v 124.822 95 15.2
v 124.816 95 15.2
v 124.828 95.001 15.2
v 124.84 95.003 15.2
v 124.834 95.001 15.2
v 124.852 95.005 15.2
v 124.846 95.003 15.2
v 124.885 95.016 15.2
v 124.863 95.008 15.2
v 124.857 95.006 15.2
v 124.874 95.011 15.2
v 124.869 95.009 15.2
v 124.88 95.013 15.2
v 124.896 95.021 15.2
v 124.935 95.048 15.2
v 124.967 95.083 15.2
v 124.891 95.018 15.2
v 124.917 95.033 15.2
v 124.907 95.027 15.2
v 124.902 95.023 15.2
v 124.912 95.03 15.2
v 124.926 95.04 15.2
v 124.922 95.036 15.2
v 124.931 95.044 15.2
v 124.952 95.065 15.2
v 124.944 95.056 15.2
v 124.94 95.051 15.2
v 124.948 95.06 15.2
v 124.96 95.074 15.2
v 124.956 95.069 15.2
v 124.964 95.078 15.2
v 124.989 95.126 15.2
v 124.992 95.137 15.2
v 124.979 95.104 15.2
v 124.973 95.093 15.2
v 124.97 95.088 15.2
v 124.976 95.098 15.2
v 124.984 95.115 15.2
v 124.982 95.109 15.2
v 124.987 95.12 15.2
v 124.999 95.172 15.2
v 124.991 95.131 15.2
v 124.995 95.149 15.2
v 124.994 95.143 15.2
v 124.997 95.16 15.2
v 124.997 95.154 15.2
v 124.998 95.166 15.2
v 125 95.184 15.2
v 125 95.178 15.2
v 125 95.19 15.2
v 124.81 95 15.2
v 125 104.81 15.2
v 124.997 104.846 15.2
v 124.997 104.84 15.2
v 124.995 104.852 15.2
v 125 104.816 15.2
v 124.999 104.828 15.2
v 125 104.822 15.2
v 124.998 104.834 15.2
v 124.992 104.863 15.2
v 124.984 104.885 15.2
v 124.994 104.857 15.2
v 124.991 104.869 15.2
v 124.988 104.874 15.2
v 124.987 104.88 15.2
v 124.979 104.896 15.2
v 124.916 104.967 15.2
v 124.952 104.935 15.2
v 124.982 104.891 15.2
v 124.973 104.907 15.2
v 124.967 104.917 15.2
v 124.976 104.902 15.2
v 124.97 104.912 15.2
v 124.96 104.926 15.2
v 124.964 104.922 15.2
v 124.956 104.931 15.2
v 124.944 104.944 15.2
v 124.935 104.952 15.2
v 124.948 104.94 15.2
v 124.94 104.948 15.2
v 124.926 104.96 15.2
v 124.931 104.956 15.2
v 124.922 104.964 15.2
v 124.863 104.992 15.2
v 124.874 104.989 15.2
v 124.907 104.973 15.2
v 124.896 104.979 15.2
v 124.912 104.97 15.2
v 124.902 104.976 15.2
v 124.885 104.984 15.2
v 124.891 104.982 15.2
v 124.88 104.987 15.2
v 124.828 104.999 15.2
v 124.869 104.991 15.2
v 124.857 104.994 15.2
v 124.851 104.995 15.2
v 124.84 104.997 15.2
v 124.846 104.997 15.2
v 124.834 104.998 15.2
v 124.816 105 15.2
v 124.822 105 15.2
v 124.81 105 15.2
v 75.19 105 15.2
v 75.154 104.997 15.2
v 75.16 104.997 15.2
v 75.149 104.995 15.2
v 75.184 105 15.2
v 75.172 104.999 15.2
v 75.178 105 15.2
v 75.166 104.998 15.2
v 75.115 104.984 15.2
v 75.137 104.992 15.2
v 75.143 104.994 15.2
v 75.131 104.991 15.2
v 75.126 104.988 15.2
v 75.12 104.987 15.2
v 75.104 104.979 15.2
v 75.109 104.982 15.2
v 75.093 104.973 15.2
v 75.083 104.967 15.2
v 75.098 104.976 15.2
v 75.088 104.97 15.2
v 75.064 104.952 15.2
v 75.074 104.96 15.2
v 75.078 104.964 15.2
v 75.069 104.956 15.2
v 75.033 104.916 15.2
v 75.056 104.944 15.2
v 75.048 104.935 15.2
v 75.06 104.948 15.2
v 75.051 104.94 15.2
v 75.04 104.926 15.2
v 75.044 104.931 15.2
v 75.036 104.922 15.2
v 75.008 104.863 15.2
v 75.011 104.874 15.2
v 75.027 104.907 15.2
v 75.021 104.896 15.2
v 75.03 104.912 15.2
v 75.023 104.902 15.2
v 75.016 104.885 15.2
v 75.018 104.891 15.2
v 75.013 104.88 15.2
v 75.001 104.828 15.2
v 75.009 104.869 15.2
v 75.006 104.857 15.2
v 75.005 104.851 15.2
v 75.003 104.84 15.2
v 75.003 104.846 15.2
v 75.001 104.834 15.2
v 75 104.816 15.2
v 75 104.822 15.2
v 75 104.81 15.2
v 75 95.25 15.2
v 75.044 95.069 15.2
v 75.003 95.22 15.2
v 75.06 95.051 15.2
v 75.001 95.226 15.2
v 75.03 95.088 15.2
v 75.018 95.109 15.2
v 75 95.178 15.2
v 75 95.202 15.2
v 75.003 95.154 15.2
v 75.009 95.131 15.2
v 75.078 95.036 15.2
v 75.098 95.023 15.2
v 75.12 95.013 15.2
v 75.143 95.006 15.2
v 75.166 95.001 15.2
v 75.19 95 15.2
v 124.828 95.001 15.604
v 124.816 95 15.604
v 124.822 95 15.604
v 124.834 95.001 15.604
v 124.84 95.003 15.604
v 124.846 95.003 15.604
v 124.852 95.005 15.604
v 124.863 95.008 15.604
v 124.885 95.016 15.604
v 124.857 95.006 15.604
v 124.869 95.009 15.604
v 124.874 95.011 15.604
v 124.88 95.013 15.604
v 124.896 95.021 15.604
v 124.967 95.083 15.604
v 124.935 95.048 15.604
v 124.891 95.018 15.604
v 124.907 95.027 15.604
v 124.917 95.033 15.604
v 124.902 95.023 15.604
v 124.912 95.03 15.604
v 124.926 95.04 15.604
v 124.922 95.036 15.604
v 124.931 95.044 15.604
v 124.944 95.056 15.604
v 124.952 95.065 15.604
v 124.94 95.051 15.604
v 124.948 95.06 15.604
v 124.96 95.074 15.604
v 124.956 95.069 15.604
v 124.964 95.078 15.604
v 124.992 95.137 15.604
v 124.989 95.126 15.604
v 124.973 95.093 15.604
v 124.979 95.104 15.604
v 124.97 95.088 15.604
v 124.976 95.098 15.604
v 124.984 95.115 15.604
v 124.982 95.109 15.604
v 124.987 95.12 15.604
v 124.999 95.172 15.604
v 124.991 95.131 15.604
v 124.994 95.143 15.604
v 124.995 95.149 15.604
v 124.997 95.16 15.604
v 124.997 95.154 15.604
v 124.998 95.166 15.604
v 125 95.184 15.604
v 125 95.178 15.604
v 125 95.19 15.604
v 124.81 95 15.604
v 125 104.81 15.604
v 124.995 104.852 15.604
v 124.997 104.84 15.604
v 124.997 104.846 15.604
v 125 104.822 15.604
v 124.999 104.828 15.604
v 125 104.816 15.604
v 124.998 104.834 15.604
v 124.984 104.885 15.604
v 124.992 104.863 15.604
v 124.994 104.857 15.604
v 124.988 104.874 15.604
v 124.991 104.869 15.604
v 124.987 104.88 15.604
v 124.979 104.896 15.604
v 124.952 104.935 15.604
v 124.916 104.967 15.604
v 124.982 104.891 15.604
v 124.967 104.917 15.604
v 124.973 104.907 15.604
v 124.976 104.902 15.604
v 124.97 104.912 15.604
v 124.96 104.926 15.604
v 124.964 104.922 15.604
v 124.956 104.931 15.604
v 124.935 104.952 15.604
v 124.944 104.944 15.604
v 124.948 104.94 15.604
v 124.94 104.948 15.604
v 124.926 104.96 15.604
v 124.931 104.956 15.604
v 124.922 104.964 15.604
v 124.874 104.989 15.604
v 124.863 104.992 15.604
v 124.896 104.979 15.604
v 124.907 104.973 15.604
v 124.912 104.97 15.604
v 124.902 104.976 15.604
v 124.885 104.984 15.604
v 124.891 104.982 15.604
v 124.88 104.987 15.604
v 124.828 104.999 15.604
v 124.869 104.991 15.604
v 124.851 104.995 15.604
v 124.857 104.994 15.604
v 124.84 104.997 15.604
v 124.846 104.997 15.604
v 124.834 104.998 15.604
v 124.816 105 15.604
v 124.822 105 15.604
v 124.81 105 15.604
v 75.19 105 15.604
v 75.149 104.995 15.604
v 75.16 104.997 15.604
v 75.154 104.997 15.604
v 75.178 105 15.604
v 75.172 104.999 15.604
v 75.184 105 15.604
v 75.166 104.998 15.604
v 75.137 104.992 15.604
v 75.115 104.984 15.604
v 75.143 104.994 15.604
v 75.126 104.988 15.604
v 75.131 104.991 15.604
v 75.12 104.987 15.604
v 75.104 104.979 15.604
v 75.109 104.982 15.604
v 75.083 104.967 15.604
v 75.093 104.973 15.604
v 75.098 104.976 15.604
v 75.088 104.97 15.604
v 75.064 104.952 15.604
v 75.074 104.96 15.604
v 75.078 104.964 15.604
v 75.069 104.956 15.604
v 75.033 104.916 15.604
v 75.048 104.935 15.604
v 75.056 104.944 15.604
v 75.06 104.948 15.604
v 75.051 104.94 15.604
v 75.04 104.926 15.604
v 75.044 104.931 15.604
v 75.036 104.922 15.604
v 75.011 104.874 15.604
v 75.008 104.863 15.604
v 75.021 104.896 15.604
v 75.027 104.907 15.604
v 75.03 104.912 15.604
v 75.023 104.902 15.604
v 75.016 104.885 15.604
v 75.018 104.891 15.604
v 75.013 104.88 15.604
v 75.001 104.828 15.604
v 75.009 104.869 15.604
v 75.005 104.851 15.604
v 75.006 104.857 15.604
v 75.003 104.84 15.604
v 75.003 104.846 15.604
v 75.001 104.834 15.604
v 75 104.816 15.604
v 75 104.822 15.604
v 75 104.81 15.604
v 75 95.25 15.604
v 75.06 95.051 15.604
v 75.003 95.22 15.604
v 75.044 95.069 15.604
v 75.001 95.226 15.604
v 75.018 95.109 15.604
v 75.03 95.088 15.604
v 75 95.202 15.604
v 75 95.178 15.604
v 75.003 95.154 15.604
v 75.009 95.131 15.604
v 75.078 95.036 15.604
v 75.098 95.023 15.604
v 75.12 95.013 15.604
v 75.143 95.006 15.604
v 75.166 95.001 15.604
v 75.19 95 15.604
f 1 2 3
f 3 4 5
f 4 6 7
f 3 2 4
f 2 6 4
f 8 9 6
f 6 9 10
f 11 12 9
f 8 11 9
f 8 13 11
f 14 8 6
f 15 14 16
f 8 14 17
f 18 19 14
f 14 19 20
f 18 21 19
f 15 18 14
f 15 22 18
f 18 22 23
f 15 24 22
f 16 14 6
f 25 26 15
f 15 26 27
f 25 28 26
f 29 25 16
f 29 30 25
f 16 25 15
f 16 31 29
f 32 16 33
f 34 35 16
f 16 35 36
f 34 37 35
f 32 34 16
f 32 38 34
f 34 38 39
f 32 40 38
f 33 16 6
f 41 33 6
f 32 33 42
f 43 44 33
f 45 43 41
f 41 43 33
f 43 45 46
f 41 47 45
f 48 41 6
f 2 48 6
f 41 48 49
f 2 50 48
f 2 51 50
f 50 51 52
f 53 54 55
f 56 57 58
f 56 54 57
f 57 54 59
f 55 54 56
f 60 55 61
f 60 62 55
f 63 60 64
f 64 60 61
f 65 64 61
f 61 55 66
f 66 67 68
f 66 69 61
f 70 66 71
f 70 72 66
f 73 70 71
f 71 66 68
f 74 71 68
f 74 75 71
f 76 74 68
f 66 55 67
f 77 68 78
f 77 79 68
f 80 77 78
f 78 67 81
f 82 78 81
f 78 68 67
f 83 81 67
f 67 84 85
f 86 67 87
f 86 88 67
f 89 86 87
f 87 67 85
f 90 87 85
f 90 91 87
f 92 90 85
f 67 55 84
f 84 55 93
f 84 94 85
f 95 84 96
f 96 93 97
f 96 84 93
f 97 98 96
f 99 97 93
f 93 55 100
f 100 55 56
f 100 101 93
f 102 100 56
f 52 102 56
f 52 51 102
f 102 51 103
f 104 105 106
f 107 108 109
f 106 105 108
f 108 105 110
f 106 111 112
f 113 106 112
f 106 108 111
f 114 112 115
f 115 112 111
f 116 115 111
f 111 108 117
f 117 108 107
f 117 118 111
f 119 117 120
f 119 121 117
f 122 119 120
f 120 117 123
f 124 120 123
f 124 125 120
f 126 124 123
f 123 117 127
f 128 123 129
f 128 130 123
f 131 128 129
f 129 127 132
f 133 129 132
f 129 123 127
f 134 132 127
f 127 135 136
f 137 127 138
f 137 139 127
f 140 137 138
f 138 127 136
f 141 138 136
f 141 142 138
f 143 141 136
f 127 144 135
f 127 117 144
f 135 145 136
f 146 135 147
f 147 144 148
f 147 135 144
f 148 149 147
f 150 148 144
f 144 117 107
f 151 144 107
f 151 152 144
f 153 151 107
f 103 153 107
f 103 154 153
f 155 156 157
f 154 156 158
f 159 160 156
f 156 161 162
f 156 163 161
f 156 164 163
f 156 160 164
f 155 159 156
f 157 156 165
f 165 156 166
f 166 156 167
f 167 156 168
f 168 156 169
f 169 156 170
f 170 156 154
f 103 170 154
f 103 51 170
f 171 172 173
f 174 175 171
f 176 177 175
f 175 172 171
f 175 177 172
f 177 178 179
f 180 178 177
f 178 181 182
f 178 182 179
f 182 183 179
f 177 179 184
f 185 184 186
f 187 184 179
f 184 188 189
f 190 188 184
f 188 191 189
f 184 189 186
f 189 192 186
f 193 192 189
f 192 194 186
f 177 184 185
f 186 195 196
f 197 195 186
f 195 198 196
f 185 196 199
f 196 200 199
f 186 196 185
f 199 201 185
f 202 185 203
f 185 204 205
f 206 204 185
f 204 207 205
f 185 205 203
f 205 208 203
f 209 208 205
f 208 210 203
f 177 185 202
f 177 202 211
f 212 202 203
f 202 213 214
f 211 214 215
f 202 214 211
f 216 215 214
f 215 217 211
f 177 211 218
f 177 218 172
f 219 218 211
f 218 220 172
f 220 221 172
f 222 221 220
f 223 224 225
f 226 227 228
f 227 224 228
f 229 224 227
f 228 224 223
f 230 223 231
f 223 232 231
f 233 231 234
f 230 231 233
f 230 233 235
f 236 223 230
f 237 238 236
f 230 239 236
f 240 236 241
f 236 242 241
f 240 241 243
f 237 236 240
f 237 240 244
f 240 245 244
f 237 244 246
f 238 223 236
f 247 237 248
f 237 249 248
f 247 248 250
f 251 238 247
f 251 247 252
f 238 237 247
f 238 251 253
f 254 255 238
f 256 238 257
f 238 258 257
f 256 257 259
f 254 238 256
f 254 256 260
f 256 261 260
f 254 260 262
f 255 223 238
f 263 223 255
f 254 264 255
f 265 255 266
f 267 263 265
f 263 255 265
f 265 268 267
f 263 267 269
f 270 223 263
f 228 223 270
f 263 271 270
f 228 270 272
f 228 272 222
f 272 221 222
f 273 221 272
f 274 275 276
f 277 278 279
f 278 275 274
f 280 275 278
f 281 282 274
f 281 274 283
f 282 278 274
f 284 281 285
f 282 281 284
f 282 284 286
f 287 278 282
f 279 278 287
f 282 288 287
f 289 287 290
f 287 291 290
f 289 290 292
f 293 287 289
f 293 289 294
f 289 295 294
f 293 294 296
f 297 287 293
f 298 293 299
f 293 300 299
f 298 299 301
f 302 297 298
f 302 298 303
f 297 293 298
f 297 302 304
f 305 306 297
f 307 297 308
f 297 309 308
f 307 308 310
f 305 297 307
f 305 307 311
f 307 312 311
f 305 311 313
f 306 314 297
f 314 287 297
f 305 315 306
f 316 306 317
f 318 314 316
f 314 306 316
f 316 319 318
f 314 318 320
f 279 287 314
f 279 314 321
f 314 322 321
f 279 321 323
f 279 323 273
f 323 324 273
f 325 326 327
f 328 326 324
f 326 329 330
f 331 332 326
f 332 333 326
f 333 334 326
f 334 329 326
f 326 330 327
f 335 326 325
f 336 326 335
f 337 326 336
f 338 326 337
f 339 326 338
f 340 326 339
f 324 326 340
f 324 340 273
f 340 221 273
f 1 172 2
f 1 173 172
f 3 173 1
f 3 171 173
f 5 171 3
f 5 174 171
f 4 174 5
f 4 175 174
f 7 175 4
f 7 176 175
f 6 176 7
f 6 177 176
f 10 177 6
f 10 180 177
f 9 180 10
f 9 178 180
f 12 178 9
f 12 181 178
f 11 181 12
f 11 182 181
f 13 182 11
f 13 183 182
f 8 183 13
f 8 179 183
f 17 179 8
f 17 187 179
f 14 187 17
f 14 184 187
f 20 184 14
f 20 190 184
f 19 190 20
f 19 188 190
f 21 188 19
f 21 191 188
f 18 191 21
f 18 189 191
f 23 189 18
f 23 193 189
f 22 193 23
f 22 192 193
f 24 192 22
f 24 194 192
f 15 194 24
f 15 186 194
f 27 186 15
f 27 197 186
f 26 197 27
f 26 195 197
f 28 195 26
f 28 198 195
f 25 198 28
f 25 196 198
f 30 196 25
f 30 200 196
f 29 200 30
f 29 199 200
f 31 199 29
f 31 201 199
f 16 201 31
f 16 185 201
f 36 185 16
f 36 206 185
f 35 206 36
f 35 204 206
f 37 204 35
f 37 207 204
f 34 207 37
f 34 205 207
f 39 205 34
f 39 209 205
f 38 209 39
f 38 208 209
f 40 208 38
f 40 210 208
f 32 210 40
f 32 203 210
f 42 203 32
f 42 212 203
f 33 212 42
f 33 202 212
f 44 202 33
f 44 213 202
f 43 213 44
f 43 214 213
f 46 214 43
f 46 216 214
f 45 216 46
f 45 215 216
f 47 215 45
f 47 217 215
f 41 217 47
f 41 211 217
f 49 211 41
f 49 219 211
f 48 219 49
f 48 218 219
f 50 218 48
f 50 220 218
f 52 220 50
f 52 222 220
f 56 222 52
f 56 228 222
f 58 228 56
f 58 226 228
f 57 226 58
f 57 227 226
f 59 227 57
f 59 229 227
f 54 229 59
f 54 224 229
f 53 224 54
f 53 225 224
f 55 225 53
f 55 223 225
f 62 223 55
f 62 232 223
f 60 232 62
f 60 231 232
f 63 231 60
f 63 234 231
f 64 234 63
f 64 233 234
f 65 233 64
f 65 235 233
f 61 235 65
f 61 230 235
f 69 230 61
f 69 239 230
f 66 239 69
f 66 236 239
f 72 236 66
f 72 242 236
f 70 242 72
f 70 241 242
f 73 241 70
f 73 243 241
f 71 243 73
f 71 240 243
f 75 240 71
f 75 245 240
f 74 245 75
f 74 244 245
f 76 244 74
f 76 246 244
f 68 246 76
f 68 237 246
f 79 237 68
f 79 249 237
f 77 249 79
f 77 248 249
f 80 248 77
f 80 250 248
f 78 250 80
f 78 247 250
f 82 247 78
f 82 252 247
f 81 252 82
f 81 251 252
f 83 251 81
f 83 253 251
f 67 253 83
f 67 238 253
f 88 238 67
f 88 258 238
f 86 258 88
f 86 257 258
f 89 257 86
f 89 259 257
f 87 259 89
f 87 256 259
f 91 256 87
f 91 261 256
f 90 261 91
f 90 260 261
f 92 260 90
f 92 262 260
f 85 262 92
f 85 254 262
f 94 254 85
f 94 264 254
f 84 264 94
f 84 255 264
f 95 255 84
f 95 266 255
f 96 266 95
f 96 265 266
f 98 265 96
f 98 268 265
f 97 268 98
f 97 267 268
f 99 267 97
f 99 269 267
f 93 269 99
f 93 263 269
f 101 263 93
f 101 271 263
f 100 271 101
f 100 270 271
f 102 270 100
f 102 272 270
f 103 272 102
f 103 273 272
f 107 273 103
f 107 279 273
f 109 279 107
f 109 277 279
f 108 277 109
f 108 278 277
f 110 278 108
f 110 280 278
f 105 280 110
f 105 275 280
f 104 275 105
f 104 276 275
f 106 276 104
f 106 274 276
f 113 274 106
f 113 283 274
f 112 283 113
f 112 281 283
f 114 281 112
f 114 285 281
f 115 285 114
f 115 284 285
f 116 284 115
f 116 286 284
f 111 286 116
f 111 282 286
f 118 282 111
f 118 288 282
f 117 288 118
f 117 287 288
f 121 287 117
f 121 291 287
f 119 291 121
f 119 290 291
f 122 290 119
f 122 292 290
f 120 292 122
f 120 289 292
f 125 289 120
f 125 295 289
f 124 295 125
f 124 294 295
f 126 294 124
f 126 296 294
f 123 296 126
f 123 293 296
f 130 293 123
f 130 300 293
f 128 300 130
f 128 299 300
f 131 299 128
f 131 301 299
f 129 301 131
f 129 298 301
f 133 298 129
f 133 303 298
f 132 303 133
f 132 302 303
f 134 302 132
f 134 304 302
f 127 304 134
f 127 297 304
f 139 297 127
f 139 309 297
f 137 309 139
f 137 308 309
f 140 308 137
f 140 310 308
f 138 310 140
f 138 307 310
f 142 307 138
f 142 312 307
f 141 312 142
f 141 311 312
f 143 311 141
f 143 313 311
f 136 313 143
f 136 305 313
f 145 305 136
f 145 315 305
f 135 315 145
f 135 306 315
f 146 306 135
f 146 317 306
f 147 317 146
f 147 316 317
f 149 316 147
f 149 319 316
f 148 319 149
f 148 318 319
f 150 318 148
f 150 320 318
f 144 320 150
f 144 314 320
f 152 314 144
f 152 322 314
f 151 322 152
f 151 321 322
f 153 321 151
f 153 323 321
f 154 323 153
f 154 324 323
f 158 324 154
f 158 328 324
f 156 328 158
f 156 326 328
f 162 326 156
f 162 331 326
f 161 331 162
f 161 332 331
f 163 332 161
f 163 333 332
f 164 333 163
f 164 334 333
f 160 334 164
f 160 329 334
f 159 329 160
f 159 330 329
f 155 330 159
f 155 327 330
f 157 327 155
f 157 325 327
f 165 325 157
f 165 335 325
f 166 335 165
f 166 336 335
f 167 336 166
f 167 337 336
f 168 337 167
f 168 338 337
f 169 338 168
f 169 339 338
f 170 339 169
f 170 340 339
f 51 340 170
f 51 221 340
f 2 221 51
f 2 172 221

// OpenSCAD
module drawBasicShape(x1, y1, x2, y2, width)
{
	length = sqrt((x1-x2)*(x1-x2) + (y1-y2)*(y1-y2));
	if (width!=0.0) {
		square(size = [width, length], center = false);
		translate([width/2.0, 0, 0]) circle(d=width);
		translate([width/2.0, length, 0]) circle(d=width);
	}
}

module translateAndRotate(x1, y1, x2, y2, width)
{
	if (width != 0.0) {
		angle = atan((y2-y1)/(x2-x1)) +270;
		if (x2>=x1) {
			translate([x1, y1, 0.0]) rotate([0.0, 0.0, angle]) translate([-width/2.0, 0.0, 0.0]) scale([1.0, 1.0, 1.0]) drawBasicShape(x1, y1, x2, y2, width);
		}
		else {
			translate([x1, y1, 0.0]) rotate([0.0, 0.0, angle+180]) translate([-width/2.0, 0.0, 0.0]) scale([1.0, 1.0, 1.0]) drawBasicShape(x1, y1, x2, y2, width);		}
	}
}

$fn=50;

points37 = [
[75.77800000, 95.77800000, 0.00000000],
[124.22200000, 95.77800000, 0.37999672],
[124.22200000, 104.22200000, 0.37997788],
[75.77800000, 104.22200000, 0.37999548],
[75.77800000, 95.83800000, 0.37998140],
[75.48400000, 95.48400000, 0.00000000],
[124.51600000, 95.48400000, 0.37999746],
[124.51600000, 104.51600000, 0.37998977],
[75.48400000, 104.51600000, 0.37999868],
[75.48400000, 95.54400000, 0.37998644],
[75.19000000, 95.19000000, 0.00000000],
[124.81000000, 95.19000000, 0.37999939],
[124.81000000, 104.81000000, 0.38000021],
[75.19000000, 104.81000000, 0.38000060],
[75.19000000, 95.25000000, 0.37999715],
[75.53600000, 95.39000000, 0.00000000],
[76.11100000, 95.94600000, 0.00000000],
[75.94600000, 96.11100000, 0.38038683],
[75.94600000, 96.52800000, 0.38087711],
[76.52800000, 95.94600000, 0.38062992],
[76.94500000, 95.94600000, 0.38073291],
[75.94600000, 96.94500000, 0.38071263],
[75.94600000, 97.36200000, 0.38087711],
[77.36200000, 95.94600000, 0.38074663],
[77.77900000, 95.94600000, 0.38073291],
[75.94600000, 97.77900000, 0.38074196],
[75.94600000, 98.19600000, 0.38087711],
[78.19600000, 95.94600000, 0.38075792],
[78.61300000, 95.94600000, 0.38073291],
[75.94600000, 98.61300000, 0.38076888],
[75.94600000, 99.03000000, 0.38087711],
[79.03000000, 95.94600000, 0.38076310],
[79.44700000, 95.94600000, 0.38087711],
[75.94600000, 99.44700000, 0.38077084],
[75.94600000, 99.86400000, 0.38073291],
[79.86400000, 95.94600000, 0.38077693],
[80.28100000, 95.94600000, 0.38087711],
[75.94600000, 100.28100000, 0.38077204],
[75.94600000, 100.69800000, 0.38087711],
[80.69800000, 95.94600000, 0.38077696],
[81.11500000, 95.94600000, 0.38073291],
[75.94600000, 101.11500000, 0.38078108],
[75.94600000, 101.53300000, 0.38017128],
[81.53300000, 95.94600000, 0.38072419],
[81.95000000, 95.94600000, 0.38087711],
[75.94600000, 101.95000000, 0.38073140],
[75.94600000, 102.36700000, 0.38073291],
[82.36700000, 95.94600000, 0.38073768],
[82.78400000, 95.94600000, 0.38087711],
[75.94600000, 102.78400000, 0.38073697],
[75.94600000, 103.20100000, 0.38087711],
[83.20100000, 95.94600000, 0.38074221],
[83.61800000, 95.94600000, 0.38087711],
[75.94600000, 103.61800000, 0.38074688],
[75.95600000, 104.02400000, 0.38122759],
[84.03500000, 95.94600000, 0.38075015],
[84.45200000, 95.94600000, 0.38087711],
[76.34400000, 104.05400000, 0.38075221],
[76.76100000, 104.05400000, 0.38087711],
[84.86900000, 95.94600000, 0.38075221],
[85.28600000, 95.94600000, 0.38087711],
[77.17800000, 104.05400000, 0.38075221],
[77.59500000, 104.05400000, 0.38087711],
[85.70300000, 95.94600000, 0.38075221],
[86.12000000, 95.94600000, 0.38087711],
[78.01200000, 104.05400000, 0.38075221],
[78.42900000, 104.05400000, 0.38087711],
[86.53700000, 95.94600000, 0.38075221],
[86.95400000, 95.94600000, 0.38087711],
[78.84600000, 104.05400000, 0.38075221],
[79.26300000, 104.05400000, 0.38087711],
[87.37100000, 95.94600000, 0.38075221],
[87.78900000, 95.94600000, 0.38017128],
[79.68000000, 104.05400000, 0.38073402],
[80.09700000, 104.05400000, 0.38087711],
[88.20600000, 95.94600000, 0.38073402],
[88.62300000, 95.94600000, 0.38087711],
[80.51400000, 104.05400000, 0.38073402],
[80.93200000, 104.05400000, 0.38017128],
[89.04000000, 95.94600000, 0.38075221],
[89.45700000, 95.94600000, 0.38087711],
[81.34900000, 104.05400000, 0.38075221],
[81.76600000, 104.05400000, 0.38087711],
[89.87400000, 95.94600000, 0.38075221],
[90.29100000, 95.94600000, 0.38087711],
[82.18300000, 104.05400000, 0.38075221],
[82.60000000, 104.05400000, 0.38087711],
[90.70800000, 95.94600000, 0.38075221],
[91.12500000, 95.94600000, 0.38087711],
[83.01700000, 104.05400000, 0.38075221],
[83.43400000, 104.05400000, 0.38087711],
[91.54200000, 95.94600000, 0.38075221],
[91.95900000, 95.94600000, 0.38087711],
[83.85100000, 104.05400000, 0.38075221],
[84.26800000, 104.05400000, 0.38087711],
[92.37600000, 95.94600000, 0.38075221],
[92.79300000, 95.94600000, 0.38087711],
[84.68500000, 104.05400000, 0.38075221],
[85.10200000, 104.05400000, 0.38087711],
[93.21000000, 95.94600000, 0.38075221],
[93.62700000, 95.94600000, 0.38087711],
[85.51900000, 104.05400000, 0.38075221],
[85.93600000, 104.05400000, 0.38087711],
[94.04400000, 95.94600000, 0.38075221],
[94.46200000, 95.94600000, 0.38017128],
[86.35300000, 104.05400000, 0.38073402],
[86.77000000, 104.05400000, 0.38087711],
[94.87900000, 95.94600000, 0.38073402],
[95.29600000, 95.94600000, 0.38087711],
[87.18800000, 104.05400000, 0.38075221],
[87.60500000, 104.05400000, 0.38087711],
[95.71300000, 95.94600000, 0.38075221],
[96.13000000, 95.94600000, 0.38087711],
[88.02200000, 104.05400000, 0.38075221],
[88.43900000, 104.05400000, 0.38087711],
[96.54700000, 95.94600000, 0.38075221],
[96.96400000, 95.94600000, 0.38087711],
[88.85600000, 104.05400000, 0.38075221],
[89.27300000, 104.05400000, 0.38087711],
[97.38100000, 95.94600000, 0.38075221],
[97.79800000, 95.94600000, 0.38087711],
[89.69000000, 104.05400000, 0.38075221],
[90.10700000, 104.05400000, 0.38087711],
[98.21500000, 95.94600000, 0.38075221],
[98.63200000, 95.94600000, 0.38087711],
[90.52400000, 104.05400000, 0.38075221],
[90.94100000, 104.05400000, 0.38087711],
[99.04900000, 95.94600000, 0.38075221],
[99.46600000, 95.94600000, 0.38087711],
[91.35800000, 104.05400000, 0.38075221],
[91.77500000, 104.05400000, 0.38087711],
[99.88300000, 95.94600000, 0.38075221],
[100.30000000, 95.94600000, 0.38087711],
[92.19200000, 104.05400000, 0.38075221],
[92.60900000, 104.05400000, 0.38087711],
[100.71800000, 95.94600000, 0.38073402],
[101.13500000, 95.94600000, 0.38087711],
[93.02600000, 104.05400000, 0.38073402],
[93.44400000, 104.05400000, 0.38017128],
[101.55200000, 95.94600000, 0.38075221],
[101.96900000, 95.94600000, 0.38087711],
[93.86100000, 104.05400000, 0.38075221],
[94.27800000, 104.05400000, 0.38087711],
[102.38600000, 95.94600000, 0.38075221],
[102.80300000, 95.94600000, 0.38087711],
[94.69500000, 104.05400000, 0.38075745],
[95.11200000, 104.05400000, 0.38073291],
[103.22000000, 95.94600000, 0.38075745],
[103.63700000, 95.94600000, 0.38073291],
[95.52900000, 104.05400000, 0.38075745],
[95.94600000, 104.05400000, 0.38073291],
[104.05400000, 95.94600000, 0.38075745],
[104.47100000, 95.94600000, 0.38073291],
[96.36300000, 104.05400000, 0.38075745],
[96.78000000, 104.05400000, 0.38073291],
[104.88800000, 95.94600000, 0.38075745],
[105.30500000, 95.94600000, 0.38073291],
[97.19700000, 104.05400000, 0.38075745],
[97.61400000, 104.05400000, 0.38073291],
[105.72200000, 95.94600000, 0.38075745],
[106.13900000, 95.94600000, 0.38073291],
[98.03100000, 104.05400000, 0.38075745],
[98.44800000, 104.05400000, 0.38073291],
[106.55600000, 95.94600000, 0.38075745],
[106.97300000, 95.94600000, 0.38073291],
[98.86500000, 104.05400000, 0.38075745],
[99.28200000, 104.05400000, 0.38073291],
[107.39100000, 95.94600000, 0.38073927],
[107.80800000, 95.94600000, 0.38073291],
[99.69900000, 104.05400000, 0.38073927],
[100.11700000, 104.05400000, 0.38002742],
[108.22500000, 95.94600000, 0.38075745],
[108.64200000, 95.94600000, 0.38073291],
[100.53400000, 104.05400000, 0.38075745],
[100.95100000, 104.05400000, 0.38073291],
[109.05900000, 95.94600000, 0.38075745],
[109.47600000, 95.94600000, 0.38073291],
[101.36800000, 104.05400000, 0.38075745],
[101.78500000, 104.05400000, 0.38073291],
[109.89300000, 95.94600000, 0.38075745],
[110.31000000, 95.94600000, 0.38073291],
[102.20200000, 104.05400000, 0.38075745],
[102.61900000, 104.05400000, 0.38073291],
[110.72700000, 95.94600000, 0.38075745],
[111.14400000, 95.94600000, 0.38073291],
[103.03600000, 104.05400000, 0.38075745],
[103.45300000, 104.05400000, 0.38073291],
[111.56100000, 95.94600000, 0.38075745],
[111.97800000, 95.94600000, 0.38073291],
[103.87000000, 104.05400000, 0.38075745],
[104.28700000, 104.05400000, 0.38073291],
[112.39500000, 95.94600000, 0.38075745],
[112.81200000, 95.94600000, 0.38073291],
[104.70400000, 104.05400000, 0.38075745],
[105.12100000, 104.05400000, 0.38073291],
[113.22900000, 95.94600000, 0.38075745],
[113.64700000, 95.94600000, 0.38002742],
[105.53800000, 104.05400000, 0.38073927],
[105.95500000, 104.05400000, 0.38073291],
[114.06400000, 95.94600000, 0.38073927],
[114.48100000, 95.94600000, 0.38073291],
[106.37300000, 104.05400000, 0.38075745],
[106.79000000, 104.05400000, 0.38073291],
[114.89800000, 95.94600000, 0.38075745],
[115.31500000, 95.94600000, 0.38073291],
[107.20700000, 104.05400000, 0.38075745],
[107.62400000, 104.05400000, 0.38073291],
[115.73200000, 95.94600000, 0.38075745],
[116.14900000, 95.94600000, 0.38073291],
[108.04100000, 104.05400000, 0.38075745],
[108.45800000, 104.05400000, 0.38073291],
[116.56600000, 95.94600000, 0.38075745],
[116.98300000, 95.94600000, 0.38073291],
[108.87500000, 104.05400000, 0.38075745],
[109.29200000, 104.05400000, 0.38073291],
[117.40000000, 95.94600000, 0.38075745],
[117.81700000, 95.94600000, 0.38073291],
[109.70900000, 104.05400000, 0.38075745],
[110.12600000, 104.05400000, 0.38073291],
[118.23400000, 95.94600000, 0.38075745],
[118.65100000, 95.94600000, 0.38073291],
[110.54300000, 104.05400000, 0.38075745],
[110.96000000, 104.05400000, 0.38073291],
[119.06800000, 95.94600000, 0.38075745],
[119.48500000, 95.94600000, 0.38073291],
[111.37700000, 104.05400000, 0.38075745],
[111.79400000, 104.05400000, 0.38073291],
[119.90300000, 95.94600000, 0.38073927],
[120.32000000, 95.94600000, 0.38073291],
[112.21100000, 104.05400000, 0.38073927],
[112.62900000, 104.05400000, 0.38002742],
[120.73700000, 95.94600000, 0.38075745],
[121.15400000, 95.94600000, 0.38073291],
[113.04600000, 104.05400000, 0.38075745],
[113.46300000, 104.05400000, 0.38073291],
[121.57100000, 95.94600000, 0.38075745],
[121.98800000, 95.94600000, 0.38073291],
[113.88000000, 104.05400000, 0.38075745],
[114.29700000, 104.05400000, 0.38087711],
[122.40500000, 95.94600000, 0.38075221],
[122.82200000, 95.94600000, 0.38087711],
[114.71400000, 104.05400000, 0.38075221],
[115.13100000, 104.05400000, 0.38087711],
[123.23900000, 95.94600000, 0.38075221],
[123.65600000, 95.94600000, 0.38087711],
[115.54800000, 104.05400000, 0.38075221],
[115.96500000, 104.05400000, 0.38087711],
[124.04400000, 95.97500000, 0.38073190],
[124.05400000, 96.38200000, 0.38050226],
[116.38200000, 104.05400000, 0.38074688],
[116.79900000, 104.05400000, 0.38087711],
[124.05400000, 96.79900000, 0.38074807],
[124.05400000, 97.21600000, 0.38073291],
[117.21600000, 104.05400000, 0.38074319],
[117.63300000, 104.05400000, 0.38087711],
[124.05400000, 97.63300000, 0.38073768],
[124.05400000, 98.05000000, 0.38073291],
[118.05000000, 104.05400000, 0.38073848],
[118.46700000, 104.05400000, 0.38073291],
[124.05400000, 98.46700000, 0.38073180],
[124.05400000, 98.88400000, 0.38087711],
[118.88400000, 104.05400000, 0.38072403],
[119.30200000, 104.05400000, 0.38017128],
[124.05400000, 99.30200000, 0.38077696],
[124.05400000, 99.71900000, 0.38087711],
[119.71900000, 104.05400000, 0.38078185],
[120.13600000, 104.05400000, 0.38073291],
[124.05400000, 100.13600000, 0.38077693],
[124.05400000, 100.55300000, 0.38087711],
[120.55300000, 104.05400000, 0.38077084],
[120.97000000, 104.05400000, 0.38087711],
[124.05400000, 100.97000000, 0.38076310],
[124.05400000, 101.38700000, 0.38087711],
[121.38700000, 104.05400000, 0.38076888],
[121.80400000, 104.05400000, 0.38087711],
[124.05400000, 101.80400000, 0.38075792],
[124.05400000, 102.22100000, 0.38073291],
[122.22100000, 104.05400000, 0.38076515],
[122.63800000, 104.05400000, 0.38087711],
[124.05400000, 102.63800000, 0.38074663],
[124.05400000, 103.05500000, 0.38073291],
[123.05500000, 104.05400000, 0.38075519],
[123.47200000, 104.05400000, 0.38073291],
[124.05400000, 103.47200000, 0.38070298],
[124.05400000, 103.88900000, 0.38073291],
[123.88900000, 104.05400000, 0.38038683],
];

translate([0.0, 0.0, 15.20000000]) {
	linear_extrude(height = 0.40400000, center = false, convexity = 10, twist = 0) {
		union() {
			for( i=[0:len(points37)-2] ){ 
				x1 = points37[i][0];
				y1 = points37[i][1];
				x2 = points37[i+1][0];
				y2 = points37[i+1][1];
				width = points37[i+1][2];
				translateAndRotate(x1, y1, x2, y2, width);
			}
		}
	}
}
